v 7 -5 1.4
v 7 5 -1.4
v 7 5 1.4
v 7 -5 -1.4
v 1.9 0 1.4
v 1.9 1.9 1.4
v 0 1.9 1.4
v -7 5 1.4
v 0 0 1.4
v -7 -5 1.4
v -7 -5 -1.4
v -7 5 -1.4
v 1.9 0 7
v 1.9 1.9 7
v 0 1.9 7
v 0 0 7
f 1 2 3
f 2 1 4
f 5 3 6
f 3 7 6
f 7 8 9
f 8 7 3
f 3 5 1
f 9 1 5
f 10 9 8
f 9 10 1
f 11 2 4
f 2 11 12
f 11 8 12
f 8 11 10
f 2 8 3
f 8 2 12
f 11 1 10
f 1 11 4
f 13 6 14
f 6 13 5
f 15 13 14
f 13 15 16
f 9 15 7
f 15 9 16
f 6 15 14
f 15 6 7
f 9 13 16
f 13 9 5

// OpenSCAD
include <prelude.scad>

module keyholeCutout()
{
    back(5.9) contactHole();
    back(3.8) right(5) contactHole();
    cyl(d = 3.2 + 2 * $slop, h = 4, anchor = TOP);
    xflip_copy() left(5.5) cyl(d = 1.8 + 2 * $slop, h = 4, anchor = TOP);
}

module keyholePos() union()
{
    back(5.9) bbox() contactHole();
    back(3.8) right(5) bbox() contactHole();
}

module contactHole()
{
    let(bs = 1.7 + 2 * $slop) cube([ bs, bs, 7 ], anchor = TOP) position(BOTTOM) let(bs = 1.8 + 2 * $slop)
        cube([ bs, bs, 1.5 ], anchor = BOTTOM);
}

module key_module() difference()
{
    union()
    {
        down(PTH) linear_extrude(PTH) hexagon(id = SP + $eps, realign = true);
        keyholePos();
    }
    zscale(1.01) up(0.01) keyholeCutout();
}

// key_module();
contactHole();
